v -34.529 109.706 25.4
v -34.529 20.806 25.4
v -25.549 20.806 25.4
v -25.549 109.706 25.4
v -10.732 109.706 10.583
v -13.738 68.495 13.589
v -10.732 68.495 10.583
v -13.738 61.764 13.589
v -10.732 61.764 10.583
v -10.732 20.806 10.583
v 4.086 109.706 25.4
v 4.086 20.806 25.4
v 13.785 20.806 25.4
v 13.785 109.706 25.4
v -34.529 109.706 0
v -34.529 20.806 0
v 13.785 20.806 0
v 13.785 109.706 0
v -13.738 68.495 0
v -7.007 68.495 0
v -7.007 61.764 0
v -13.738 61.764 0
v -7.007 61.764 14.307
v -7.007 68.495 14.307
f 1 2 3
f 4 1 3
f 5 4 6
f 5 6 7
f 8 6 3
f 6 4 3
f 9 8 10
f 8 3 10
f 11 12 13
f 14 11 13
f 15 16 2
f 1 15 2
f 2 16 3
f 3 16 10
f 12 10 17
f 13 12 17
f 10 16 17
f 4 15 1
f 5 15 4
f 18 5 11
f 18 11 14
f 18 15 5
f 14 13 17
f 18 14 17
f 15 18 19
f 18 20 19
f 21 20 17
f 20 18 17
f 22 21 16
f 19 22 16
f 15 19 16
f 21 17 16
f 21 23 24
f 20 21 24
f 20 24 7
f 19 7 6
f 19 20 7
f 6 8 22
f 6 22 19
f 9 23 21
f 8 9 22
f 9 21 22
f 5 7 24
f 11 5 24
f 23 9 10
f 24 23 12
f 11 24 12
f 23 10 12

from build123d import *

# Parameters (mm, degrees)
F1_DEPTH = 88.9
F2_W     = 6.731
F2_H     = 6.731
F3_DEPTH = 49.5578889657
F4_ANGLE = 45
F5_ANGLE = 90
F6_ANGLE = 90


with BuildPart() as f1:
    # F0 (on Top) → F1 (new body)
    with BuildSketch(Plane.XY):
        Polygon((-10.7315, -10.7315), (-10.7315, 10.2235), (10.2235, 10.2235), (17.0815, 17.0815), (-0.8790122421, 35.0420122421), (-35.0420122421, 0.8790122421), (-17.0815, -17.0815), align=None)
    extrude(amount=F1_DEPTH)

    # F2 (on face) → F3 (cut, through all)
    with BuildSketch(Plane(origin=(-17.9605122421, 17.9605122421, 0), x_dir=(-0.7071067812, -0.7071067812, 0), z_dir=(-0.7071067812, 0.7071067812, 0))):
        with Locations((0, 44.323)):
            Rectangle(F2_W, F2_H)
    extrude(amount=-F3_DEPTH, mode=Mode.SUBTRACT)


with BuildPart() as f1_1:
    # F4: moved
    add(f1.part.rotate(Axis((-10.7315, 10.2235, 20.47875), (0, 0, -1)), F4_ANGLE))


with BuildPart() as f1_2:
    # F5: moved
    add(f1_1.part.rotate(Axis((-10.3722897552, 20.8060774002, 0), (-1, 0, 0)), F5_ANGLE))


with BuildPart() as f6_1:
    # F6: copy of F1
    add(f1_2.part.rotate(Axis((13.7845992105, 20.8060774002, 12.7), (0, 0, 1)), F6_ANGLE))


with BuildPart() as f6_1_1:
    # F7: moved
    add(f6_1.part.moved(Location((19.05, 0, 0))))


solid = f1_2.part
